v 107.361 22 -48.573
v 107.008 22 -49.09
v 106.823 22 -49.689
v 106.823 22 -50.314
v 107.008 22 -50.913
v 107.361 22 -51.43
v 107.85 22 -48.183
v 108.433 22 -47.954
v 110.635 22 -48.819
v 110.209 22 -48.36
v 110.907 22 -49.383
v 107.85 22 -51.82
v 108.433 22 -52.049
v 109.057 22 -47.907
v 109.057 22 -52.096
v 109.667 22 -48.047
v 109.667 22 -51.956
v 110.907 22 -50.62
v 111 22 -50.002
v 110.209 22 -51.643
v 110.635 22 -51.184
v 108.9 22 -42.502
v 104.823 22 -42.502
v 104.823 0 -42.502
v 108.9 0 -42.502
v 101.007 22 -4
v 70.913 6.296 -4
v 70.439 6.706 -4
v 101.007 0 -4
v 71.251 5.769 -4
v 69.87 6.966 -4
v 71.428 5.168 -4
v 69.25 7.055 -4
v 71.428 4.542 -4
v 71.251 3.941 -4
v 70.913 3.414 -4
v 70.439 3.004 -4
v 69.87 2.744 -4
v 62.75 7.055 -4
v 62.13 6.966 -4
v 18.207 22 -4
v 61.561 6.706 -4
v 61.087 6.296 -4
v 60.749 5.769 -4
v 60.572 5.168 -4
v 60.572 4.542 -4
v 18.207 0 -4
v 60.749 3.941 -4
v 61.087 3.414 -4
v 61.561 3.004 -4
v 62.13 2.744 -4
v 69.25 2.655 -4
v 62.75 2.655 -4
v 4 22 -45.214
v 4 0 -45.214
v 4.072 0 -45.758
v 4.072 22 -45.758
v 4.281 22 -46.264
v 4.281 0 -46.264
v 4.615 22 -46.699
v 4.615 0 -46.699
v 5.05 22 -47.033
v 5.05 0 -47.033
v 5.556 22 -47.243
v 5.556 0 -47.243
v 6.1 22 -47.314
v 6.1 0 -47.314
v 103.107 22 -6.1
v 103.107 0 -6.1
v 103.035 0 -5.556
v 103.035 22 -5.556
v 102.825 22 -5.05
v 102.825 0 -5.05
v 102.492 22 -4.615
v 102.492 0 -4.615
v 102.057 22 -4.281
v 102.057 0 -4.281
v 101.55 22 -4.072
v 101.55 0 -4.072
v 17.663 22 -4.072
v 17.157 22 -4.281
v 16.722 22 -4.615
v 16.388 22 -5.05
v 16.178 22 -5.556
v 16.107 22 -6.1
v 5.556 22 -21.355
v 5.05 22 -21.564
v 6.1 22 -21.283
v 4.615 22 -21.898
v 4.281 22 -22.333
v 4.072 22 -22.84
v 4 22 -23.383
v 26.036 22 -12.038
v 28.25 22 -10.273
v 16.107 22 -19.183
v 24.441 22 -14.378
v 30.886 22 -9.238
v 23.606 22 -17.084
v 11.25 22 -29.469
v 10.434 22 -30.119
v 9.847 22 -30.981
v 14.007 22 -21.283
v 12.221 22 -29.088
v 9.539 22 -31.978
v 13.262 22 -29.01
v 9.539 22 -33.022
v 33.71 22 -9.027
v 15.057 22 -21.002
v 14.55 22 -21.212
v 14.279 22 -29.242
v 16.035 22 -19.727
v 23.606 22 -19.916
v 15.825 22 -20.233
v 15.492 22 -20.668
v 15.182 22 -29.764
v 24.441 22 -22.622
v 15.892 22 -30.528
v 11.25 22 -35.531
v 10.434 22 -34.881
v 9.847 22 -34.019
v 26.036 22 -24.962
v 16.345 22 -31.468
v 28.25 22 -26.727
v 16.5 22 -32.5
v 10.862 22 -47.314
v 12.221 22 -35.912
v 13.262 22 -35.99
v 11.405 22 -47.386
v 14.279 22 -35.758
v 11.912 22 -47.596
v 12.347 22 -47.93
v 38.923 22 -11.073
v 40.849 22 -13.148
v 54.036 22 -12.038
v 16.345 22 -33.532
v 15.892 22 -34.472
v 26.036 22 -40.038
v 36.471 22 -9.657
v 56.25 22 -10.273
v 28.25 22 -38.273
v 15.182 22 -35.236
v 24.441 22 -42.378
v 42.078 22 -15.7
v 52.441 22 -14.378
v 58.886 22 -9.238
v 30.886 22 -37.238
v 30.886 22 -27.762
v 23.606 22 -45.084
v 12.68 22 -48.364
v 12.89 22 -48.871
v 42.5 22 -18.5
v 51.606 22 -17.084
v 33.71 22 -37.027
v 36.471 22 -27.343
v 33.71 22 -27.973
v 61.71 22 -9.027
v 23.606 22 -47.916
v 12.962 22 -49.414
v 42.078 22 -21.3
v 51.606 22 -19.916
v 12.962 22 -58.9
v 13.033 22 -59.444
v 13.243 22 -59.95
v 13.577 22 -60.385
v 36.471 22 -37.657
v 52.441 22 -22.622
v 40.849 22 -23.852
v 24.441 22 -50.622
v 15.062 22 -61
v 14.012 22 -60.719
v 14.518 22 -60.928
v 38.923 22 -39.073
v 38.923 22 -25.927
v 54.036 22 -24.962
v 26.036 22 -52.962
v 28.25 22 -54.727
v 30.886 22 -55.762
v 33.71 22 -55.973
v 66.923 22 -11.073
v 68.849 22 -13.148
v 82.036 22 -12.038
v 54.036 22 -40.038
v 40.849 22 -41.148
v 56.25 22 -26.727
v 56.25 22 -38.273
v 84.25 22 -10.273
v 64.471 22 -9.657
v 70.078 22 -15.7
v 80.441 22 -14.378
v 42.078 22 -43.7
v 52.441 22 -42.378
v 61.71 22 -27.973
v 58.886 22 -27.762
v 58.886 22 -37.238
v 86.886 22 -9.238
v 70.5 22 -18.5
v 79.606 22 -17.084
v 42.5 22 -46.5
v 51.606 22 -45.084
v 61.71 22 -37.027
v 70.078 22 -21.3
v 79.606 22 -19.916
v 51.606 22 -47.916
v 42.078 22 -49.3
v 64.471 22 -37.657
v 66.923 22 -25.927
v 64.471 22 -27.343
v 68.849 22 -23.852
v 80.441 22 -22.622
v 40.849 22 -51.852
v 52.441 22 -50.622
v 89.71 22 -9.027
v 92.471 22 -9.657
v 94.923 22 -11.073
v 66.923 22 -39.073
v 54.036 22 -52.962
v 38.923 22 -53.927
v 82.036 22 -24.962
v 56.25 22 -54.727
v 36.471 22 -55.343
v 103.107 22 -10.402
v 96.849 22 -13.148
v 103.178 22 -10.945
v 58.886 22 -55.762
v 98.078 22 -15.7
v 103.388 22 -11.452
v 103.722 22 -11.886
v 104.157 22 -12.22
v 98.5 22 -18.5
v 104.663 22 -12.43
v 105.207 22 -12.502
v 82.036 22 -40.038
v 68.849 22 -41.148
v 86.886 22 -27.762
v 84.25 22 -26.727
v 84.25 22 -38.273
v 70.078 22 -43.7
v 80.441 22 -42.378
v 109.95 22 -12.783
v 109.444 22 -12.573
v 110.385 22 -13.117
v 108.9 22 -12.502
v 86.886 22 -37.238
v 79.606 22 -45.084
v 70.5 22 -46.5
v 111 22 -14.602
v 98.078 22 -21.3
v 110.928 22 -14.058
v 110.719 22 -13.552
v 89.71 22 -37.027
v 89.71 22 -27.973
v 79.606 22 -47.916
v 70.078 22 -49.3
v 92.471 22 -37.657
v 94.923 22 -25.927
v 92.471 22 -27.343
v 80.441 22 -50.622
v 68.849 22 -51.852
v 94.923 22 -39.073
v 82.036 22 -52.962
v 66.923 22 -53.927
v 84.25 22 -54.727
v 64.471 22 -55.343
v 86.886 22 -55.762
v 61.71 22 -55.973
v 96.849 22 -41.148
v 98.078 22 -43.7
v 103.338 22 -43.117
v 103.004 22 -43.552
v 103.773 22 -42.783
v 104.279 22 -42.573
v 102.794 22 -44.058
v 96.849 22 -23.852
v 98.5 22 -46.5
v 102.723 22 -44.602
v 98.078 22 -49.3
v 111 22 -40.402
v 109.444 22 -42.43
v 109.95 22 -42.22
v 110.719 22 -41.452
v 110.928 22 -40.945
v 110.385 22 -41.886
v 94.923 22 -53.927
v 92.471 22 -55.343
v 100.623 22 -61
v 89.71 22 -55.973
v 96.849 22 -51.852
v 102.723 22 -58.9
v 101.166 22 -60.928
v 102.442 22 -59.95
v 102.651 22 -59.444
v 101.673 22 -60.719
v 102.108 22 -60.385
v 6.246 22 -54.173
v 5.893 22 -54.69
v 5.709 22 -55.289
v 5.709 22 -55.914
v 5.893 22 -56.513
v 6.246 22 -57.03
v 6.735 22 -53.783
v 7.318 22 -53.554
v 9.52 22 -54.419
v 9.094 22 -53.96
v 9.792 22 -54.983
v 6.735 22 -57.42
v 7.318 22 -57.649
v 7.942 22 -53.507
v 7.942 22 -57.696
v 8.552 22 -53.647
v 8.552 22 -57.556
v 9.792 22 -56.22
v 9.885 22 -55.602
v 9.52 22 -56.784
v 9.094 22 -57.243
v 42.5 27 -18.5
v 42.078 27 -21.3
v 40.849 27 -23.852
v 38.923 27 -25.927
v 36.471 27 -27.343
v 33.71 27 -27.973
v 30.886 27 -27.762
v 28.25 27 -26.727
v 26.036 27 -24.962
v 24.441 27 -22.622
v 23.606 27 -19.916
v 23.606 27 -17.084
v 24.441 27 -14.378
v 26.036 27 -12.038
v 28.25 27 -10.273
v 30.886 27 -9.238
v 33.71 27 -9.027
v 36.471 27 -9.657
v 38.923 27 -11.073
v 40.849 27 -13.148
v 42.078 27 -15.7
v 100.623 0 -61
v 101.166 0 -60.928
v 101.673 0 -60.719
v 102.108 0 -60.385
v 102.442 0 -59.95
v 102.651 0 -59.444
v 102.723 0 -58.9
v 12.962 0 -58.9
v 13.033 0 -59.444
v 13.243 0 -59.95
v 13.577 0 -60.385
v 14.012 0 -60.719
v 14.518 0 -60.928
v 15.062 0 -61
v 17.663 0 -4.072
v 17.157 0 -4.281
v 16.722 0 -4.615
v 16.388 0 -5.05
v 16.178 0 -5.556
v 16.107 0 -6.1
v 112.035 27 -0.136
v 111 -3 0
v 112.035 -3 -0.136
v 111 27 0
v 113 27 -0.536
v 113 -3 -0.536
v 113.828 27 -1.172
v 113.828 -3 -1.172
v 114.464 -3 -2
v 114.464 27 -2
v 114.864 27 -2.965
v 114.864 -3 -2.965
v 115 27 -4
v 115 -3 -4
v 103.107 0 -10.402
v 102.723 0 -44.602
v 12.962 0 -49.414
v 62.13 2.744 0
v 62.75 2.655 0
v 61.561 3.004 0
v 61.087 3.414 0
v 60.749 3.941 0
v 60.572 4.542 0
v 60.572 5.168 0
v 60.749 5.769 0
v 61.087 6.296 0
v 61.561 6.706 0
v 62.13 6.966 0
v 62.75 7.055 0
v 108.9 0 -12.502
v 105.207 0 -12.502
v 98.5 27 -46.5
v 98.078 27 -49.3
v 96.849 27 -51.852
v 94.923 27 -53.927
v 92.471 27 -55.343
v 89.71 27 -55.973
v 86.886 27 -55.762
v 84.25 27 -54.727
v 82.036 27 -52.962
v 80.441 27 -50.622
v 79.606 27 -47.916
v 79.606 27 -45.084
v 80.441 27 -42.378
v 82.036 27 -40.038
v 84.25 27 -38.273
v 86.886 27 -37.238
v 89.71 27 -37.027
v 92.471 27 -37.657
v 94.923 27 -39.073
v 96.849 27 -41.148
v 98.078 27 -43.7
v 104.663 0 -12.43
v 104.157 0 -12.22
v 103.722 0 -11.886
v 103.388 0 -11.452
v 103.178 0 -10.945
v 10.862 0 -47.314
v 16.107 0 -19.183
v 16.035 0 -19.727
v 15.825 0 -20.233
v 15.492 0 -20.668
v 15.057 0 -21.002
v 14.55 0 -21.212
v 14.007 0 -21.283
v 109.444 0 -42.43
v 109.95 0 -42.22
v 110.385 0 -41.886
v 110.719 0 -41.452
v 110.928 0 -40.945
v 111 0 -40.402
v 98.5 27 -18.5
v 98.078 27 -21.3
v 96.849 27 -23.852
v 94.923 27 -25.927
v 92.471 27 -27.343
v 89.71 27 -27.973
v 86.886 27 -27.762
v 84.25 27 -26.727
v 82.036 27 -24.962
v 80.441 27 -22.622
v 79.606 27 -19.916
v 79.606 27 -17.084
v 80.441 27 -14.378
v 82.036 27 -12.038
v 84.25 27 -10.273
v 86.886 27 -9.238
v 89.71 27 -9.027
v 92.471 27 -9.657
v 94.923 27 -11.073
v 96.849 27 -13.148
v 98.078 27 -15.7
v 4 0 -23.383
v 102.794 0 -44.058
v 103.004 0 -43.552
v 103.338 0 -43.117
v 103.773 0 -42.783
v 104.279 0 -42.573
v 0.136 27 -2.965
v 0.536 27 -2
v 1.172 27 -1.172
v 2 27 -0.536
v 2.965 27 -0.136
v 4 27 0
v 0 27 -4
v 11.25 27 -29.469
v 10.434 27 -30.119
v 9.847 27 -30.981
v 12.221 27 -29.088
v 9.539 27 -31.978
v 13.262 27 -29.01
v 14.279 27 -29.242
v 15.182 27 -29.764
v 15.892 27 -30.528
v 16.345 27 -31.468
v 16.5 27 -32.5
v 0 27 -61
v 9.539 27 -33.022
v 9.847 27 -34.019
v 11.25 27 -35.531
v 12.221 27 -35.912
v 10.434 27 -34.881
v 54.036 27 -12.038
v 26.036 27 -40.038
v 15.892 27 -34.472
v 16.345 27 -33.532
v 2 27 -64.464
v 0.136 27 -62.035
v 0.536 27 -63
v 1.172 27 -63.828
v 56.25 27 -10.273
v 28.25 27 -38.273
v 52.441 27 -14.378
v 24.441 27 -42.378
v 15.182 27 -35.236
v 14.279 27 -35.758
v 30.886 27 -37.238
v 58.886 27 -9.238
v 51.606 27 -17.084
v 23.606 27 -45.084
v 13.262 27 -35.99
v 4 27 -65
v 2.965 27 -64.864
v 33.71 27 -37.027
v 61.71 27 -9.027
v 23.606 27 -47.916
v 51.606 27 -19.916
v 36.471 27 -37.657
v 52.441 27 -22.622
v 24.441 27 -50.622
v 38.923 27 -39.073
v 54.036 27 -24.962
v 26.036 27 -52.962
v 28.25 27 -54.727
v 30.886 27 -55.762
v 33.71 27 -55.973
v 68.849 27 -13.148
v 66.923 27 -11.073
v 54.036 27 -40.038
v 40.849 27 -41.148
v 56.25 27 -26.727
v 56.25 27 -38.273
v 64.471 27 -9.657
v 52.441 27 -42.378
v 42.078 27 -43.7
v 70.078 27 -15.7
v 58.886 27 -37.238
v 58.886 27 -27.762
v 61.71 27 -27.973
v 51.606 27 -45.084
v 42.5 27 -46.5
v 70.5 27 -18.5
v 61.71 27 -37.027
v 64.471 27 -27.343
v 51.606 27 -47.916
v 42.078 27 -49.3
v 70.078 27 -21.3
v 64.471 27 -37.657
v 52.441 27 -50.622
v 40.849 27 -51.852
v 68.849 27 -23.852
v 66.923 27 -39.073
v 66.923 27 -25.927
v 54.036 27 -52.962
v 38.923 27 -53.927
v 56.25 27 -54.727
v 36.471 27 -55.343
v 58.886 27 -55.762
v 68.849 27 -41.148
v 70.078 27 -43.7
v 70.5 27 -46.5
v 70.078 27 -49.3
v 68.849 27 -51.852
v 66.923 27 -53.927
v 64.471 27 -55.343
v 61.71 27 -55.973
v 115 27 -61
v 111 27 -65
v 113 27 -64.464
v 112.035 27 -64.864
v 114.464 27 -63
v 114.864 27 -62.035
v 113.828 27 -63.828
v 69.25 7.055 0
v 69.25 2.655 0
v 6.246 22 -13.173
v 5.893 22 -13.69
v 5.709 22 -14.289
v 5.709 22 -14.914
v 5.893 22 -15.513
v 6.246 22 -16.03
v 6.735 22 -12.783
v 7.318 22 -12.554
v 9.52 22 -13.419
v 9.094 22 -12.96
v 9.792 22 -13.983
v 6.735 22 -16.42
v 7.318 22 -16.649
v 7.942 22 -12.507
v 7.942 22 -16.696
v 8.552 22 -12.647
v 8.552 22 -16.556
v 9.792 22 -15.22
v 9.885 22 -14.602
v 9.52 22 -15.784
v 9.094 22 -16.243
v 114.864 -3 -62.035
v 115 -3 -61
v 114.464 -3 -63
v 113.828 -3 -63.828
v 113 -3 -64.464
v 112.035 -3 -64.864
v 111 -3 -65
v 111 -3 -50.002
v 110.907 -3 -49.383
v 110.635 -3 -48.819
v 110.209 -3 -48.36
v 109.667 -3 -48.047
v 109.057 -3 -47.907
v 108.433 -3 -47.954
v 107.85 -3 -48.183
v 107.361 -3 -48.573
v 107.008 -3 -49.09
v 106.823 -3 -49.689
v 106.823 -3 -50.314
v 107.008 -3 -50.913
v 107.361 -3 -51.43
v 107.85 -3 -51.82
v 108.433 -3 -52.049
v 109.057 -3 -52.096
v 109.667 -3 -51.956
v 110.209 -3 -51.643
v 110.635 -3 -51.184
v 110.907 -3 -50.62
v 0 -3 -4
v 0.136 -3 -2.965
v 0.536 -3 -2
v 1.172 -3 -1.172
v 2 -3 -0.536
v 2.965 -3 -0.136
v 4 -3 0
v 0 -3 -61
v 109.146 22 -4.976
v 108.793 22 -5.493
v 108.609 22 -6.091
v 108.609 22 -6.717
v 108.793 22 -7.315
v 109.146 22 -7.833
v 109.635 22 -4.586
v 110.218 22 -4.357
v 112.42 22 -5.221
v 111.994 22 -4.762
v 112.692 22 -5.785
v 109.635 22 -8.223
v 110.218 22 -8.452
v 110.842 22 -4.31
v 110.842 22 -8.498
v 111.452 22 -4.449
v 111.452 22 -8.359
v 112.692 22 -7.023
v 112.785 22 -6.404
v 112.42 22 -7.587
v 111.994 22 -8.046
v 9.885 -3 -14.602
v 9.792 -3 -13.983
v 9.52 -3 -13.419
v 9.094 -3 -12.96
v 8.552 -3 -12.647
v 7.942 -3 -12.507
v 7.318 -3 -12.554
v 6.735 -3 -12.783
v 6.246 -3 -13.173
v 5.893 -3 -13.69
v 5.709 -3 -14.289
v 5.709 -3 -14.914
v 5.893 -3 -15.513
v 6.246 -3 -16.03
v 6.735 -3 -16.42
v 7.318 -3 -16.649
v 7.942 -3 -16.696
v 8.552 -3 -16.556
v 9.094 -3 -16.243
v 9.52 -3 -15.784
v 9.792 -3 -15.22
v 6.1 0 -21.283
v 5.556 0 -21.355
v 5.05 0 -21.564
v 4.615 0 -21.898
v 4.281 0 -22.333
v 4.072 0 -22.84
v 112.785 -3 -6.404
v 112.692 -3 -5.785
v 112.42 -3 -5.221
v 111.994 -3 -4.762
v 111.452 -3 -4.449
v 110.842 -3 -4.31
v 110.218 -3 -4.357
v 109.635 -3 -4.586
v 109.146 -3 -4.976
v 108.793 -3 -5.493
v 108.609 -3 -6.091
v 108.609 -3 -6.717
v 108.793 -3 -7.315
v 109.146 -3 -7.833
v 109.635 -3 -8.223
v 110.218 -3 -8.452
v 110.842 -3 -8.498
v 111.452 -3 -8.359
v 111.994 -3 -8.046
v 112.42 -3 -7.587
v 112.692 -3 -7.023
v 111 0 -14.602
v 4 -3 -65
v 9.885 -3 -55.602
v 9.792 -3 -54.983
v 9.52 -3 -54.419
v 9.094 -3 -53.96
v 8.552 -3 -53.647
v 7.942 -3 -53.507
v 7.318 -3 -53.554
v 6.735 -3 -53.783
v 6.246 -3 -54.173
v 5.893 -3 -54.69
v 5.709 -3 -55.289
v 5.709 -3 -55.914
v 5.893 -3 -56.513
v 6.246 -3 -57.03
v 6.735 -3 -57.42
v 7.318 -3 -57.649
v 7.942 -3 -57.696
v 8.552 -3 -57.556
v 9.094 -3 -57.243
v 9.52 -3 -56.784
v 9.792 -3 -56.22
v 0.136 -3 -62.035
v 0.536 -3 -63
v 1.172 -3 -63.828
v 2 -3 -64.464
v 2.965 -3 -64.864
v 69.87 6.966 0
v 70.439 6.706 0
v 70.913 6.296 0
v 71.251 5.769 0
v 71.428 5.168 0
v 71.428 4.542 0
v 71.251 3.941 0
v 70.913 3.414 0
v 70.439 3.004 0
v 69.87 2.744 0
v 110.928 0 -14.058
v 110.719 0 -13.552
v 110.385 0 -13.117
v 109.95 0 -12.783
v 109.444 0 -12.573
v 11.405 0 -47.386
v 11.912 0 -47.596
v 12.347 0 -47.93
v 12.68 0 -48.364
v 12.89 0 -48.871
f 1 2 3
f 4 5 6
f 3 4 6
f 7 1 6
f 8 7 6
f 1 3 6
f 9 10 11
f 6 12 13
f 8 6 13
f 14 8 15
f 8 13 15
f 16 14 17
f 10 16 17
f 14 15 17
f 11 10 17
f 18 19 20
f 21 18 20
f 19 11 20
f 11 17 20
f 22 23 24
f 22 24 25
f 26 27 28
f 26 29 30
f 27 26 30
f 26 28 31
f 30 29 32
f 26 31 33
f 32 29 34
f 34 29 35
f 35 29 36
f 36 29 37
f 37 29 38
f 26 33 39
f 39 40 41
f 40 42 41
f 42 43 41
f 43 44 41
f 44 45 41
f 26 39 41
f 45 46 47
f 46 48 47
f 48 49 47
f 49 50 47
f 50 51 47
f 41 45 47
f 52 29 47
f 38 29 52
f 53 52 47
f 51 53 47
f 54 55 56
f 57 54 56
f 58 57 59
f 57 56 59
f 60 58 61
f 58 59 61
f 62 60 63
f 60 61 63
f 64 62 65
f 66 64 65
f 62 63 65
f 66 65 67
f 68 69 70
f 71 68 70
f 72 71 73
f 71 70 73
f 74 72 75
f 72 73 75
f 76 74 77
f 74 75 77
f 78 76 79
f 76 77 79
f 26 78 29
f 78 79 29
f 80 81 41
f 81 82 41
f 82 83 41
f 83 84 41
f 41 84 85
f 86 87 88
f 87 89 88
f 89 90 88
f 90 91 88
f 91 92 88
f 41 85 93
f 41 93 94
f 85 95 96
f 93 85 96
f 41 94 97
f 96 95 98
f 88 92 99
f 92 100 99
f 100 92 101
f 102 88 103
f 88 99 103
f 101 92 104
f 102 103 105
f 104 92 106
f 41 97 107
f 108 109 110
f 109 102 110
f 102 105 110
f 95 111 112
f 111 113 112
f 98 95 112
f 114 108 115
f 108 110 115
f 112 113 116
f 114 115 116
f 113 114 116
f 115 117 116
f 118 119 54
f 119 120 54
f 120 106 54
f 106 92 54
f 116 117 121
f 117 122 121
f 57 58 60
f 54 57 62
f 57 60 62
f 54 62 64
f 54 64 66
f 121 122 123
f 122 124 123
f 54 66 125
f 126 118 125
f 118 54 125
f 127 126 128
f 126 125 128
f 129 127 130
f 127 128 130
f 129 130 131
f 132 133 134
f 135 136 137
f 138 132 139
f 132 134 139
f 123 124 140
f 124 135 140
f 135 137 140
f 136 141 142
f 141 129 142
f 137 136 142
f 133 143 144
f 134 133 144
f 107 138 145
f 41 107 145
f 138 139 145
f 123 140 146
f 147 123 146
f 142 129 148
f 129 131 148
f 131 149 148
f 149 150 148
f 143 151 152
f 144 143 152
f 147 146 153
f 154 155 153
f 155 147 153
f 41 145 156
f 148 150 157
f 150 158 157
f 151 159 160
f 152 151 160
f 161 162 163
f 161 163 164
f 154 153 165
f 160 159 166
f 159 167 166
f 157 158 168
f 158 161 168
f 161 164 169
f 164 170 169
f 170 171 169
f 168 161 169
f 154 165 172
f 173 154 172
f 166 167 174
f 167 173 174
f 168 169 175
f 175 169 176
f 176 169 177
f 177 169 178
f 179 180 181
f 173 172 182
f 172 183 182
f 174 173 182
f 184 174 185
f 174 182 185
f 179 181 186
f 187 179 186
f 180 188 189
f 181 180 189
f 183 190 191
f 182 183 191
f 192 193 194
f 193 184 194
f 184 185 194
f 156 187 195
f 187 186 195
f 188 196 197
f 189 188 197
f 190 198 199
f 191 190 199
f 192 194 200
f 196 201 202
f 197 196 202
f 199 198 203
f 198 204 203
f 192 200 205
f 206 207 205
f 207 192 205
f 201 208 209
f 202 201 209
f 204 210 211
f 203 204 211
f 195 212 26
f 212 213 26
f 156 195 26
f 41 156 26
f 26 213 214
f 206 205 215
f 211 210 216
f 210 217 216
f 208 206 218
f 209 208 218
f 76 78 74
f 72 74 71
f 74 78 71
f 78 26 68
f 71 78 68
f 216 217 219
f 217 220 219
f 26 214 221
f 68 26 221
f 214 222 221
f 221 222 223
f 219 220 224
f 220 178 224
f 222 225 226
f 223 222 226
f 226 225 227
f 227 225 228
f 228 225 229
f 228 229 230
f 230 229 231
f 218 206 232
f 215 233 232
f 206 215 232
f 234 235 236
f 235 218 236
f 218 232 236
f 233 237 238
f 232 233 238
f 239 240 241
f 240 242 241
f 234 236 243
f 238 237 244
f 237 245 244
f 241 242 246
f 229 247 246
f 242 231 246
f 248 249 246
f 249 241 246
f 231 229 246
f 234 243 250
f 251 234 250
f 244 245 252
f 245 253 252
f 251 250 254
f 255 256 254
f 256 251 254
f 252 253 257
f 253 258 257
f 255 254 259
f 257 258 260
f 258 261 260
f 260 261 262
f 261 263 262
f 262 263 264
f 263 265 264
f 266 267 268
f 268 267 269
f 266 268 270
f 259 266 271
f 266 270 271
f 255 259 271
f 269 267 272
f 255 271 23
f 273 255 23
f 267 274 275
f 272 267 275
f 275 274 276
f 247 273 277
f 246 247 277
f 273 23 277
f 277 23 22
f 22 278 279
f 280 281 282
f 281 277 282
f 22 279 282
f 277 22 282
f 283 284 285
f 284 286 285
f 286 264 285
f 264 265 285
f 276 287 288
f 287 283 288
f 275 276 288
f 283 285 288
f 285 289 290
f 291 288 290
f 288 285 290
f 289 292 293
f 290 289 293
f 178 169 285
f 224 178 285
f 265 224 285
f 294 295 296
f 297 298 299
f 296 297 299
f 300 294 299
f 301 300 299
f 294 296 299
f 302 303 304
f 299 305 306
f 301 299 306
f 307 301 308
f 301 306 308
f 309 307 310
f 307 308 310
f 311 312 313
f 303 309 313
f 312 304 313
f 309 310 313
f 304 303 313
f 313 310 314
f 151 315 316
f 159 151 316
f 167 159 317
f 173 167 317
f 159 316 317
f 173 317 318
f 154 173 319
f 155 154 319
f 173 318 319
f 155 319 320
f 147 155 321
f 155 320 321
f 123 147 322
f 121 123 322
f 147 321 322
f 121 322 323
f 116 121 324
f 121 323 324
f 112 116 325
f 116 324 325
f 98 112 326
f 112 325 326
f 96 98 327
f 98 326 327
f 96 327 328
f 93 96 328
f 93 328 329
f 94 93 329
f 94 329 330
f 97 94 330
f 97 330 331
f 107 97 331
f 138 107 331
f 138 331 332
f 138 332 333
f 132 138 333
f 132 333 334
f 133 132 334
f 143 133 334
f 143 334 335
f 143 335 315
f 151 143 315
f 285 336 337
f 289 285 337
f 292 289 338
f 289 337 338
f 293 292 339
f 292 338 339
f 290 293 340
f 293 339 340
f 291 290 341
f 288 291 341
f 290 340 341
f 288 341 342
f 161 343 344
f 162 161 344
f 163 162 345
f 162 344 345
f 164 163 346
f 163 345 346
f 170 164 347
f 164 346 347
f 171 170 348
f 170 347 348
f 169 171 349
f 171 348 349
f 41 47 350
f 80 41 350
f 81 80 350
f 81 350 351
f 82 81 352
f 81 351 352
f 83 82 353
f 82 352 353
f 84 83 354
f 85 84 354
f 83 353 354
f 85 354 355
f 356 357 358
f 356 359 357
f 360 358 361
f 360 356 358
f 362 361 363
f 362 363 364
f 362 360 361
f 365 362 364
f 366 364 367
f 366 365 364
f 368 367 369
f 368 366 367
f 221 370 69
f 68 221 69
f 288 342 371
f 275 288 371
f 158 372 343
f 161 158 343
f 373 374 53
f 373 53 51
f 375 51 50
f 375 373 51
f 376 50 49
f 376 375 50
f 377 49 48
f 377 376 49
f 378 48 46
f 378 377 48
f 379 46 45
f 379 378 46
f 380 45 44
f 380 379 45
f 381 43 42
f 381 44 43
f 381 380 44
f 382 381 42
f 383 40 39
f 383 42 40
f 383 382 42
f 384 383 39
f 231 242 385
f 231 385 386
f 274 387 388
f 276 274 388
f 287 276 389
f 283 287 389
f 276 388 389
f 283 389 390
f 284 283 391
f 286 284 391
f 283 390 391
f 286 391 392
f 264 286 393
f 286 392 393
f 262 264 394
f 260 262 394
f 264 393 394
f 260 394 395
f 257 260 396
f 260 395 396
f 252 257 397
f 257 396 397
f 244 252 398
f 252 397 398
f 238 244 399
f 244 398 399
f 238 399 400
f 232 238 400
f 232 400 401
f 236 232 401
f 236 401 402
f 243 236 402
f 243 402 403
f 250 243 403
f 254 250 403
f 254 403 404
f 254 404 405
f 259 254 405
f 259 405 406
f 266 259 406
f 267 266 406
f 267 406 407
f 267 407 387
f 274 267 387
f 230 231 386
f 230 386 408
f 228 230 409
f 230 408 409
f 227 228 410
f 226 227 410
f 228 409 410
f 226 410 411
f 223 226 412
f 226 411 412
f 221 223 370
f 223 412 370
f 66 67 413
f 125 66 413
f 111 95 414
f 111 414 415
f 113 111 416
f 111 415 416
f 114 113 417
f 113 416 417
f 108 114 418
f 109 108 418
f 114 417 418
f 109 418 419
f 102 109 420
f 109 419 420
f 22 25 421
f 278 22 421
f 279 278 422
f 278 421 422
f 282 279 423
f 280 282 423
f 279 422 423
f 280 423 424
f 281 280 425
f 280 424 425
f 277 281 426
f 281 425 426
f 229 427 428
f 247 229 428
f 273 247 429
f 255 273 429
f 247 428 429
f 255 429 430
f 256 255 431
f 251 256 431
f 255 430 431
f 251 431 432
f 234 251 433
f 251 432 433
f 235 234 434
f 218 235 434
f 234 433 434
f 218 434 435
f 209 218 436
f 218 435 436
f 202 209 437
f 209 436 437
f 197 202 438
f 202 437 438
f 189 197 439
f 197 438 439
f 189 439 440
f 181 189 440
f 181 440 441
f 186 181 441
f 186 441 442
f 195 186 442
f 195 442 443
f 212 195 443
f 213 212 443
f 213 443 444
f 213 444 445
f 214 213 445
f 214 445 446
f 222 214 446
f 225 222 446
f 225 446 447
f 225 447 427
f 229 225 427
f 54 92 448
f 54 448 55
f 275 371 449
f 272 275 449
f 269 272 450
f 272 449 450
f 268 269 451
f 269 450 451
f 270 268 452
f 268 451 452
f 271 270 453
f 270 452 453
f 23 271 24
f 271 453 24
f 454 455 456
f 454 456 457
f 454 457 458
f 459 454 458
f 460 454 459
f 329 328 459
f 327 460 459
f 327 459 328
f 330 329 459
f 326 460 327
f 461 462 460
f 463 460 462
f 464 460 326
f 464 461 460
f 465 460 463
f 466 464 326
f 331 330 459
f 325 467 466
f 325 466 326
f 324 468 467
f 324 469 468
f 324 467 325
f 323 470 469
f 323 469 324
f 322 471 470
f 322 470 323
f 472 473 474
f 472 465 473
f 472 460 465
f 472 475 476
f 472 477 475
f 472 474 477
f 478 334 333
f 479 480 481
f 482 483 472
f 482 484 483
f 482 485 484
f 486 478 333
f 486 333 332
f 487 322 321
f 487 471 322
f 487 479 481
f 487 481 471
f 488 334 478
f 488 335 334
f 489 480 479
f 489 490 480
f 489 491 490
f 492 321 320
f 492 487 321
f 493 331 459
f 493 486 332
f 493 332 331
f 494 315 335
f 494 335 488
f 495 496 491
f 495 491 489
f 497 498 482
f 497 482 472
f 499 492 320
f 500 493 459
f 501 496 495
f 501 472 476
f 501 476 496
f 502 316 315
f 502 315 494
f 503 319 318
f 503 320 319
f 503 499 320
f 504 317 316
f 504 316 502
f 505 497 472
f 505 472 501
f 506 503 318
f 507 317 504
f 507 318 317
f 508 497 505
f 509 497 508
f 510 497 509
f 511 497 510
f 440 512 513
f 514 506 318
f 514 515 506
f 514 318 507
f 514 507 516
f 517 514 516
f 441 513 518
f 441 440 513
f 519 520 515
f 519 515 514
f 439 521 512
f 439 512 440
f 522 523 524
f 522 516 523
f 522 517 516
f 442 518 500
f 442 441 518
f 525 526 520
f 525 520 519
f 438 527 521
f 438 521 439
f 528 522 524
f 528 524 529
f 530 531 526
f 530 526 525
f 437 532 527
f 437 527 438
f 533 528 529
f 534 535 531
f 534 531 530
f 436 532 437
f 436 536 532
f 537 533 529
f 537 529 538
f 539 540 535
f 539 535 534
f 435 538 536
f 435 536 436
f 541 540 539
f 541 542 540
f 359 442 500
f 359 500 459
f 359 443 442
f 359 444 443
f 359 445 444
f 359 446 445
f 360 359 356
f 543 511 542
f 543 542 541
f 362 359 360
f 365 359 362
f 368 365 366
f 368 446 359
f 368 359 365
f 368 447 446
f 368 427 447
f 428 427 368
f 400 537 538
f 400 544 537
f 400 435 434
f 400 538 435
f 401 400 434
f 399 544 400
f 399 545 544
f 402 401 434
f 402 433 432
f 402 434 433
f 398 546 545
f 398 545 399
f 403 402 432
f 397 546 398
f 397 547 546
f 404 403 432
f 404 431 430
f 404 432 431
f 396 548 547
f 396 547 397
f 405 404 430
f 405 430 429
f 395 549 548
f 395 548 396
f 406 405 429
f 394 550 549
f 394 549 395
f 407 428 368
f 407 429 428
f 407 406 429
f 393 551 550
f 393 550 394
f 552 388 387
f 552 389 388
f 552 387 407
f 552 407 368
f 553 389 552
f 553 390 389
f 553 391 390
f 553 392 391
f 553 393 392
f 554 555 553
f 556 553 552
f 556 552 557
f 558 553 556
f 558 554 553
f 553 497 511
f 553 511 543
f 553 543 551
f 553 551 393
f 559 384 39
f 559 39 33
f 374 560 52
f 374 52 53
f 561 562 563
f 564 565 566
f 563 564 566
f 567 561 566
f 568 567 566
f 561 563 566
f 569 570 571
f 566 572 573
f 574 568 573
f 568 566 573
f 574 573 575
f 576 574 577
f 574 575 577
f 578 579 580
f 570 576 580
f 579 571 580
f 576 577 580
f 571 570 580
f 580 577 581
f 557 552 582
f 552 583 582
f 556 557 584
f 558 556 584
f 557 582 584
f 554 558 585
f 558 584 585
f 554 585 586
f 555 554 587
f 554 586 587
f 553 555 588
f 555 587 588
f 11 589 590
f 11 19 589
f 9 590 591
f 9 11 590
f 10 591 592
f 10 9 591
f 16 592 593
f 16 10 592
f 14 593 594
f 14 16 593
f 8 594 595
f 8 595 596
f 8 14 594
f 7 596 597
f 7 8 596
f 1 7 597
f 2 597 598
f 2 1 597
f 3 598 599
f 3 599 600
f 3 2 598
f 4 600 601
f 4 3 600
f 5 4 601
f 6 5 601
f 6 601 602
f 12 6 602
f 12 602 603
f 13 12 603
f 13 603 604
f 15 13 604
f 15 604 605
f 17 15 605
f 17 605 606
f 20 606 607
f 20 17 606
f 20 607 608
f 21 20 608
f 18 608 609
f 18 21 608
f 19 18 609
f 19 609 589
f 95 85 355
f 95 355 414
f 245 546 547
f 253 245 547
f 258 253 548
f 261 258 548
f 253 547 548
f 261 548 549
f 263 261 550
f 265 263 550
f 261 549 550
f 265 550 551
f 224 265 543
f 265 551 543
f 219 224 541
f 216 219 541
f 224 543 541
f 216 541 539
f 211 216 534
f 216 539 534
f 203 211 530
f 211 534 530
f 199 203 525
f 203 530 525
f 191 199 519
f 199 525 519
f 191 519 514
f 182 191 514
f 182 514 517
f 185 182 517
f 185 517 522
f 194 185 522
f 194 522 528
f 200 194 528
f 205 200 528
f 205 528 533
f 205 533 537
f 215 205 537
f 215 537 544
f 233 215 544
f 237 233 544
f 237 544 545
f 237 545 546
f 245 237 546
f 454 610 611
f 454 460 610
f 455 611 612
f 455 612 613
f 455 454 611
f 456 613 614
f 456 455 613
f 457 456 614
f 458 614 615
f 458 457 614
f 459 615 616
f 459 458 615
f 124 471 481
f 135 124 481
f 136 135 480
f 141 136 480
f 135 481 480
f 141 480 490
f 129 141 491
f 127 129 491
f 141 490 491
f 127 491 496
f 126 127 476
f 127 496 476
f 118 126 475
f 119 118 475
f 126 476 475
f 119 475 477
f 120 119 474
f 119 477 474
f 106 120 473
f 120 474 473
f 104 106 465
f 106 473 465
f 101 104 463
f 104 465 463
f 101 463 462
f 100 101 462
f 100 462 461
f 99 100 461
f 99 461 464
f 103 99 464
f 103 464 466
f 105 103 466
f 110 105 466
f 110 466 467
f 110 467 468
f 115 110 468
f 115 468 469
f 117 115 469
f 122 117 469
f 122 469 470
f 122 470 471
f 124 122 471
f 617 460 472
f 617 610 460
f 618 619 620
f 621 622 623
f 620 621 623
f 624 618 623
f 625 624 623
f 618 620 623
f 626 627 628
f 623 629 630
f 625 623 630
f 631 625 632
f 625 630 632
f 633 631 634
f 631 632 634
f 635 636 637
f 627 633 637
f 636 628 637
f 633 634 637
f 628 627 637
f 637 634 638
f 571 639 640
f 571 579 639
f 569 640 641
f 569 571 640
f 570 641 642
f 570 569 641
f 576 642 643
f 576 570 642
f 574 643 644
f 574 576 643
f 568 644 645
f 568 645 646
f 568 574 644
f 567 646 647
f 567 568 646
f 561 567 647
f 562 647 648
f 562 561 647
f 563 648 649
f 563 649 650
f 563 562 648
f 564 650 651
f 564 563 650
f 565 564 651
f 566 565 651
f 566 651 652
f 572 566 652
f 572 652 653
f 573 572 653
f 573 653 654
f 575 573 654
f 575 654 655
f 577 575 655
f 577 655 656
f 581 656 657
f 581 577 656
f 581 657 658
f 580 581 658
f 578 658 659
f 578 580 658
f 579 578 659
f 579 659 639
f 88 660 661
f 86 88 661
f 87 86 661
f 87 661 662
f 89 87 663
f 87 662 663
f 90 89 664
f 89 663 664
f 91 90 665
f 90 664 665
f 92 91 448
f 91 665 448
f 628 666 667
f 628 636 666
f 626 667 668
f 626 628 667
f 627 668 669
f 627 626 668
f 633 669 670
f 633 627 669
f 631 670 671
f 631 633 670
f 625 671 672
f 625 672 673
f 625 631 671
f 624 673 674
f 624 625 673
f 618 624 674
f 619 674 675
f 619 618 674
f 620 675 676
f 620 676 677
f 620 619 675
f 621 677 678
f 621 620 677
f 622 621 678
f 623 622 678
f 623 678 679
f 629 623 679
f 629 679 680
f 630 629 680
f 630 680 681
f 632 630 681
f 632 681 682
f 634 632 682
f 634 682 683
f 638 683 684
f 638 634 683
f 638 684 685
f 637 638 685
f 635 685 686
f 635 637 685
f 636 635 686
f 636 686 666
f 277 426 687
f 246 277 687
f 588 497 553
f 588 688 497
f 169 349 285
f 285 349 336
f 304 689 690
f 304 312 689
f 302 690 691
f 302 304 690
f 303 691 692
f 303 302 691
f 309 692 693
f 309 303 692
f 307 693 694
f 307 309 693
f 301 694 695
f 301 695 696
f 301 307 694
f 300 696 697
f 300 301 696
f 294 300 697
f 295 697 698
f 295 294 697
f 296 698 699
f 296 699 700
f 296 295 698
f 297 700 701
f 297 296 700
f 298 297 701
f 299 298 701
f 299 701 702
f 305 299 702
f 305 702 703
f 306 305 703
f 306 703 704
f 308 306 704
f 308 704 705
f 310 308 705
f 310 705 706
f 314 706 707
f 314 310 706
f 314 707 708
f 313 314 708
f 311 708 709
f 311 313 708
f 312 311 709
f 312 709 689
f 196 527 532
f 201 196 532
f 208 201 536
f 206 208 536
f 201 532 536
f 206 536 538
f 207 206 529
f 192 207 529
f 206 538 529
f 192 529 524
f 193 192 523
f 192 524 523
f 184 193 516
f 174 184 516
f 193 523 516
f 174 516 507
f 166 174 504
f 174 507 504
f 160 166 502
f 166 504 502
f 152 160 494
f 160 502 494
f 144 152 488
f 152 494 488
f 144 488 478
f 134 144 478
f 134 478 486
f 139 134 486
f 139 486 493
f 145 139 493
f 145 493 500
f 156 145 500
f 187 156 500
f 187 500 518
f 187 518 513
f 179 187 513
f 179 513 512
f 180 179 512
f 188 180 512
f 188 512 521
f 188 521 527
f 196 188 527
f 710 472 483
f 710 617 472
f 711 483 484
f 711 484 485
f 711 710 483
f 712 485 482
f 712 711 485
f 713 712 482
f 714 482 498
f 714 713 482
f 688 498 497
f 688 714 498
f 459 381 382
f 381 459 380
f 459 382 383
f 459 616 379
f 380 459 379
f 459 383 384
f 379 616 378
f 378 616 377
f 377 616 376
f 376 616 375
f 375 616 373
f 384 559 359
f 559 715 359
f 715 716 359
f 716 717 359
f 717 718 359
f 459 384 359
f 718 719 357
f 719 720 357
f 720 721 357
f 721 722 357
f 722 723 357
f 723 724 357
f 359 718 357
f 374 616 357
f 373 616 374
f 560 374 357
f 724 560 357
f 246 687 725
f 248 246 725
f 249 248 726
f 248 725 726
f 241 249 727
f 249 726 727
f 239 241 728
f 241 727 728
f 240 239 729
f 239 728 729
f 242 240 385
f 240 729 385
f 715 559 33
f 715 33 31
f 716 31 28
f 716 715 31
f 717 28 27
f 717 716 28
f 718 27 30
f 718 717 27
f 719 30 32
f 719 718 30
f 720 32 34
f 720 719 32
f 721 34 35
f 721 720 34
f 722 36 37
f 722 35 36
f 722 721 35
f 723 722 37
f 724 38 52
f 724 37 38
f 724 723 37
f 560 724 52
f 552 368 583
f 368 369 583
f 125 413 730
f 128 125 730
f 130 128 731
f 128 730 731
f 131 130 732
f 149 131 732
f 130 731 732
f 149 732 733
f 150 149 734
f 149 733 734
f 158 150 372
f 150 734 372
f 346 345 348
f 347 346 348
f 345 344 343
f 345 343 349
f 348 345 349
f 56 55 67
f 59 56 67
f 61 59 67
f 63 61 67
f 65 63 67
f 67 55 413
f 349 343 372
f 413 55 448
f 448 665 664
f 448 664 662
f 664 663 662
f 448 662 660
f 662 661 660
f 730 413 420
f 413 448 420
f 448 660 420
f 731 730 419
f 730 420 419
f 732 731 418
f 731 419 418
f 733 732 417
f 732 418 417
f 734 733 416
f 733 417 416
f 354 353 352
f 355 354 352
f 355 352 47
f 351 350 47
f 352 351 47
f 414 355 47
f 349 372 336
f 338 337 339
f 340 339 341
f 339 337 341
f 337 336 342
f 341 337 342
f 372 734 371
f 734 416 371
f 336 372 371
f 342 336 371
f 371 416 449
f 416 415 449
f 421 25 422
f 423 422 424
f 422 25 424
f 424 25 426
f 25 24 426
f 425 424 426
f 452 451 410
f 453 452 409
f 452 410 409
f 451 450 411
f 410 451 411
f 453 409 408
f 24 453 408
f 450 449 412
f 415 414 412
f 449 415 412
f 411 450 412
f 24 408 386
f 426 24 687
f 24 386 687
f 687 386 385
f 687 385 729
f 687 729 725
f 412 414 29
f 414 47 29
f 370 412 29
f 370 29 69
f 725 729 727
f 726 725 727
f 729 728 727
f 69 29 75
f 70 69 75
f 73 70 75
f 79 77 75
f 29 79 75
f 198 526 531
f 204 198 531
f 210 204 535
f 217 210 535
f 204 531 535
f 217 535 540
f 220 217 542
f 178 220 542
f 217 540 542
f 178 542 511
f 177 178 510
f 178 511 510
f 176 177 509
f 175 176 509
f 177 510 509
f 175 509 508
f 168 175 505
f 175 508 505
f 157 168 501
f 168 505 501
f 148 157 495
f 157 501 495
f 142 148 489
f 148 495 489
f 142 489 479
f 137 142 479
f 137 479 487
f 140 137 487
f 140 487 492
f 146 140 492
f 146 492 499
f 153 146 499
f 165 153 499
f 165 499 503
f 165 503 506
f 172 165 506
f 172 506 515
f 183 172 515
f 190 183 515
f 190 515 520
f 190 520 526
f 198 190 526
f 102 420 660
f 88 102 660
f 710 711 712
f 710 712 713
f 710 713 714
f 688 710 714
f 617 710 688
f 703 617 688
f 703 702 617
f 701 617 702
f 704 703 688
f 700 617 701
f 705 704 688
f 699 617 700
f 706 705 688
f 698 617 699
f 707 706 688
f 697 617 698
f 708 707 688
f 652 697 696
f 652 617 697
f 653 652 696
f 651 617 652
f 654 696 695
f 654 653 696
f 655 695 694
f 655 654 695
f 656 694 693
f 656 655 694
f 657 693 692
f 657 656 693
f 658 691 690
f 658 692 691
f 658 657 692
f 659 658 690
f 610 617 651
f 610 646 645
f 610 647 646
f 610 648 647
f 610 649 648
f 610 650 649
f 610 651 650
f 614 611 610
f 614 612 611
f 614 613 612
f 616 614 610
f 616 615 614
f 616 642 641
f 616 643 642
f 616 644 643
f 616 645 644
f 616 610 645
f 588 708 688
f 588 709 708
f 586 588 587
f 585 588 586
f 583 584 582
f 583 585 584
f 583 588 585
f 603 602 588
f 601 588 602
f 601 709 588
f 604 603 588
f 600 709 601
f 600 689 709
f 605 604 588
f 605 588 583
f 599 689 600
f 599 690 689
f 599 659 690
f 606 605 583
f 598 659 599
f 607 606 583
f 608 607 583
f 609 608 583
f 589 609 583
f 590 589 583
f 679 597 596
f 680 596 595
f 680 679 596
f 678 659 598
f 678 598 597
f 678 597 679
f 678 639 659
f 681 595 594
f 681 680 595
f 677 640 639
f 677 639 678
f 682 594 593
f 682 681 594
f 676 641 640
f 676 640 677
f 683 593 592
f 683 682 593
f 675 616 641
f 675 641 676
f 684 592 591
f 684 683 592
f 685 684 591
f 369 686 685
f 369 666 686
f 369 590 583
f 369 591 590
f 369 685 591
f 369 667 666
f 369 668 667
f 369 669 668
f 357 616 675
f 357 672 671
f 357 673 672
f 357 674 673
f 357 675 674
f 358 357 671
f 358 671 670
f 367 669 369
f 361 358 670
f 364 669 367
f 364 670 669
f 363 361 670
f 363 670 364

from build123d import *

# Parameters (mm, degrees)
SKETCH1_W           = 115
SKETCH1_H           = 65
SKETCH1_R           = 2.1
BOSS_EXTRUDE1_DEPTH = 22
BOSS_EXTRUDE4_START = 3
SKETCH6_W           = 115
SKETCH6_H           = 65
SKETCH6_R           = 2.1
BOSS_EXTRUDE4_DEPTH = 3
SKETCH7_W           = 115
SKETCH7_H           = 65
BOSS_EXTRUDE5_DEPTH = 5
FILLET1_R           = 4
CUT_EXTRUDE1_REACH  = 137.462
SKETCH4_R           = 9.5
SKETCH4_R_2         = 3.5
CUT_EXTRUDE2_REACH  = 136.83


with BuildPart() as part:
    # Sketch1 → Boss-Extrude1 (new body)
    with BuildSketch(Plane(origin=(0, 0, 0), x_dir=(1, 0, 0), z_dir=(0, 1, 0))):
        with Locations((57.5, 32.5)):
            Rectangle(SKETCH1_W, SKETCH1_H)
        with Locations((108.9, 50.001511105)):
            Circle(SKETCH1_R, mode=Mode.SUBTRACT)
        with Locations((110.685057222, 6.404275632)):
            Circle(SKETCH1_R, mode=Mode.SUBTRACT)
        with Locations((7.785057222, 14.601511105)):
            Circle(SKETCH1_R, mode=Mode.SUBTRACT)
        with Locations((7.785057222, 55.601511105)):
            Circle(SKETCH1_R, mode=Mode.SUBTRACT)
        with BuildLine():
            Line((6.1, 47.31447682), (10.861715208, 47.31447682))
            ThreePointArc((10.861715208, 47.31447682), (12.346639448, 47.929552579), (12.961715208, 49.41447682))
            Line((12.961715208, 49.41447682), (12.961715208, 58.9))
            ThreePointArc((12.961715208, 58.9), (13.576790967, 60.38492424), (15.061715208, 61))
            Line((15.061715208, 61), (100.622896336, 61))
            ThreePointArc((100.622896336, 61), (102.107820577, 60.38492424), (102.722896336, 58.9))
            Line((102.722896336, 58.9), (102.722896336, 44.601511105))
            ThreePointArc((102.722896336, 44.601511105), (103.337972096, 43.116586864), (104.822896336, 42.501511105))
            Line((104.822896336, 42.501511105), (108.9, 42.501511105))
            ThreePointArc((108.9, 42.501511105), (110.38492424, 41.886435345), (111, 40.401511105))
            Line((111, 40.401511105), (111, 14.601511105))
            ThreePointArc((111, 14.601511105), (110.38492424, 13.116586864), (108.9, 12.501511105))
            Line((108.9, 12.501511105), (105.206624477, 12.501511105))
            ThreePointArc((105.206624477, 12.501511105), (103.721700237, 11.886435345), (103.106624477, 10.401511105))
            Line((103.106624477, 10.401511105), (103.106624477, 6.1))
            ThreePointArc((103.106624477, 6.1), (102.491548718, 4.61507576), (101.006624477, 4))
            Line((101.006624477, 4), (18.206624477, 4))
            ThreePointArc((18.206624477, 4), (16.721700237, 4.61507576), (16.106624477, 6.1))
            Line((16.106624477, 6.1), (16.106624477, 19.183092127))
            ThreePointArc((16.106624477, 19.183092127), (15.491548718, 20.668016368), (14.006624477, 21.283092127))
            Line((14.006624477, 21.283092127), (6.1, 21.283092127))
            ThreePointArc((6.1, 21.283092127), (4.61507576, 21.898167887), (4, 23.383092127))
            Line((4, 23.383092127), (4, 45.21447682))
            ThreePointArc((4, 45.21447682), (4.61507576, 46.69940106), (6.1, 47.31447682))
        make_face(mode=Mode.SUBTRACT)
    extrude(amount=BOSS_EXTRUDE1_DEPTH)

    # Sketch6 → Boss-Extrude4 (add)
    with BuildSketch(Plane.XZ.offset(BOSS_EXTRUDE4_START)):
        with Locations((57.5, -32.5)):
            Rectangle(SKETCH6_W, SKETCH6_H)
        with Locations((7.785057222, -55.601511105)):
            Circle(SKETCH6_R, mode=Mode.SUBTRACT)
        with Locations((108.9, -50.001511105)):
            Circle(SKETCH6_R, mode=Mode.SUBTRACT)
        with Locations((7.785057222, -14.601511105)):
            Circle(SKETCH6_R, mode=Mode.SUBTRACT)
        with Locations((110.685057222, -6.404275632)):
            Circle(SKETCH6_R, mode=Mode.SUBTRACT)
    extrude(amount=-BOSS_EXTRUDE4_DEPTH)

    # Sketch7 → Boss-Extrude5 (add)
    with BuildSketch(Plane(origin=(0, 22, 0), x_dir=(1, 0, 0), z_dir=(0, 1, 0))):
        with Locations((57.5, 32.5)):
            Rectangle(SKETCH7_W, SKETCH7_H)
    extrude(amount=BOSS_EXTRUDE5_DEPTH)

    # Fillet1
    fillet1_edges = [part.edges().sort_by_distance(p)[0] for p in [
        (0, 12, -65),
        (115, 12, -65),
        (115, 12, 0),
        (0, 12, 0),
    ]]
    fillet(fillet1_edges, radius=FILLET1_R)

    # Sketch4 → Cut-Extrude1 (cut, up to next)
    with BuildSketch(Plane(origin=(0, 27, 0), x_dir=(1, 0, 0), z_dir=(0, 1, 0)), mode=Mode.PRIVATE) as cut_extrude1_sk1:
        with Locations((33, 46.5)):
            Circle(SKETCH4_R)
    cut_extrude1_tool1 = extrude(cut_extrude1_sk1.sketch, amount=-CUT_EXTRUDE1_REACH, mode=Mode.PRIVATE) & part.part
    # Sketch4 → Cut-Extrude1 (cut, up to next)
    with BuildSketch(Plane(origin=(0, 27, 0), x_dir=(1, 0, 0), z_dir=(0, 1, 0)), mode=Mode.PRIVATE) as cut_extrude1_sk2:
        with Locations((33, 18.5)):
            Circle(SKETCH4_R)
    cut_extrude1_tool2 = extrude(cut_extrude1_sk2.sketch, amount=-CUT_EXTRUDE1_REACH, mode=Mode.PRIVATE) & part.part
    # Sketch4 → Cut-Extrude1 (cut, up to next)
    with BuildSketch(Plane(origin=(0, 27, 0), x_dir=(1, 0, 0), z_dir=(0, 1, 0)), mode=Mode.PRIVATE) as cut_extrude1_sk3:
        with Locations((61, 46.5)):
            Circle(SKETCH4_R)
    cut_extrude1_tool3 = extrude(cut_extrude1_sk3.sketch, amount=-CUT_EXTRUDE1_REACH, mode=Mode.PRIVATE) & part.part
    # Sketch4 → Cut-Extrude1 (cut, up to next)
    with BuildSketch(Plane(origin=(0, 27, 0), x_dir=(1, 0, 0), z_dir=(0, 1, 0)), mode=Mode.PRIVATE) as cut_extrude1_sk4:
        with Locations((89, 46.5)):
            Circle(SKETCH4_R)
    cut_extrude1_tool4 = extrude(cut_extrude1_sk4.sketch, amount=-CUT_EXTRUDE1_REACH, mode=Mode.PRIVATE) & part.part
    # Sketch4 → Cut-Extrude1 (cut, up to next)
    with BuildSketch(Plane(origin=(0, 27, 0), x_dir=(1, 0, 0), z_dir=(0, 1, 0)), mode=Mode.PRIVATE) as cut_extrude1_sk5:
        with Locations((61, 18.5)):
            Circle(SKETCH4_R)
    cut_extrude1_tool5 = extrude(cut_extrude1_sk5.sketch, amount=-CUT_EXTRUDE1_REACH, mode=Mode.PRIVATE) & part.part
    # Sketch4 → Cut-Extrude1 (cut, up to next)
    with BuildSketch(Plane(origin=(0, 27, 0), x_dir=(1, 0, 0), z_dir=(0, 1, 0)), mode=Mode.PRIVATE) as cut_extrude1_sk6:
        with Locations((89, 18.5)):
            Circle(SKETCH4_R)
    cut_extrude1_tool6 = extrude(cut_extrude1_sk6.sketch, amount=-CUT_EXTRUDE1_REACH, mode=Mode.PRIVATE) & part.part
    # Sketch4 → Cut-Extrude1 (cut, up to next)
    with BuildSketch(Plane(origin=(0, 27, 0), x_dir=(1, 0, 0), z_dir=(0, 1, 0)), mode=Mode.PRIVATE) as cut_extrude1_sk7:
        with Locations((13, 32.5)):
            Circle(SKETCH4_R_2)
    cut_extrude1_tool7 = extrude(cut_extrude1_sk7.sketch, amount=-CUT_EXTRUDE1_REACH, mode=Mode.PRIVATE) & part.part
    add(cut_extrude1_tool1.solids().sort_by_distance((33, 27, -46.5))[0], mode=Mode.SUBTRACT)
    add(cut_extrude1_tool2.solids().sort_by_distance((33, 27, -18.5))[0], mode=Mode.SUBTRACT)
    add(cut_extrude1_tool3.solids().sort_by_distance((61, 27, -46.5))[0], mode=Mode.SUBTRACT)
    add(cut_extrude1_tool4.solids().sort_by_distance((89, 27, -46.5))[0], mode=Mode.SUBTRACT)
    add(cut_extrude1_tool5.solids().sort_by_distance((61, 27, -18.5))[0], mode=Mode.SUBTRACT)
    add(cut_extrude1_tool6.solids().sort_by_distance((89, 27, -18.5))[0], mode=Mode.SUBTRACT)
    add(cut_extrude1_tool7.solids().sort_by_distance((13, 27, -32.5))[0], mode=Mode.SUBTRACT)

    # Sketch5 → Cut-Extrude2 (cut, up to next)
    with BuildSketch(Plane.XY, mode=Mode.PRIVATE) as cut_extrude2_sk1:
        with BuildLine():
            Line((62.75, 7.055), (69.25, 7.055))
            ThreePointArc((69.25, 7.055), (71.45, 4.855), (69.25, 2.655))
            Line((69.25, 2.655), (62.75, 2.655))
            ThreePointArc((62.75, 2.655), (60.55, 4.855), (62.75, 7.055))
        make_face()
    cut_extrude2_tool1 = extrude(cut_extrude2_sk1.sketch, amount=-CUT_EXTRUDE2_REACH, mode=Mode.PRIVATE) & part.part
    add(cut_extrude2_tool1.solids().sort_by_distance((66, 4.855, 0))[0], mode=Mode.SUBTRACT)


solid = part.part
